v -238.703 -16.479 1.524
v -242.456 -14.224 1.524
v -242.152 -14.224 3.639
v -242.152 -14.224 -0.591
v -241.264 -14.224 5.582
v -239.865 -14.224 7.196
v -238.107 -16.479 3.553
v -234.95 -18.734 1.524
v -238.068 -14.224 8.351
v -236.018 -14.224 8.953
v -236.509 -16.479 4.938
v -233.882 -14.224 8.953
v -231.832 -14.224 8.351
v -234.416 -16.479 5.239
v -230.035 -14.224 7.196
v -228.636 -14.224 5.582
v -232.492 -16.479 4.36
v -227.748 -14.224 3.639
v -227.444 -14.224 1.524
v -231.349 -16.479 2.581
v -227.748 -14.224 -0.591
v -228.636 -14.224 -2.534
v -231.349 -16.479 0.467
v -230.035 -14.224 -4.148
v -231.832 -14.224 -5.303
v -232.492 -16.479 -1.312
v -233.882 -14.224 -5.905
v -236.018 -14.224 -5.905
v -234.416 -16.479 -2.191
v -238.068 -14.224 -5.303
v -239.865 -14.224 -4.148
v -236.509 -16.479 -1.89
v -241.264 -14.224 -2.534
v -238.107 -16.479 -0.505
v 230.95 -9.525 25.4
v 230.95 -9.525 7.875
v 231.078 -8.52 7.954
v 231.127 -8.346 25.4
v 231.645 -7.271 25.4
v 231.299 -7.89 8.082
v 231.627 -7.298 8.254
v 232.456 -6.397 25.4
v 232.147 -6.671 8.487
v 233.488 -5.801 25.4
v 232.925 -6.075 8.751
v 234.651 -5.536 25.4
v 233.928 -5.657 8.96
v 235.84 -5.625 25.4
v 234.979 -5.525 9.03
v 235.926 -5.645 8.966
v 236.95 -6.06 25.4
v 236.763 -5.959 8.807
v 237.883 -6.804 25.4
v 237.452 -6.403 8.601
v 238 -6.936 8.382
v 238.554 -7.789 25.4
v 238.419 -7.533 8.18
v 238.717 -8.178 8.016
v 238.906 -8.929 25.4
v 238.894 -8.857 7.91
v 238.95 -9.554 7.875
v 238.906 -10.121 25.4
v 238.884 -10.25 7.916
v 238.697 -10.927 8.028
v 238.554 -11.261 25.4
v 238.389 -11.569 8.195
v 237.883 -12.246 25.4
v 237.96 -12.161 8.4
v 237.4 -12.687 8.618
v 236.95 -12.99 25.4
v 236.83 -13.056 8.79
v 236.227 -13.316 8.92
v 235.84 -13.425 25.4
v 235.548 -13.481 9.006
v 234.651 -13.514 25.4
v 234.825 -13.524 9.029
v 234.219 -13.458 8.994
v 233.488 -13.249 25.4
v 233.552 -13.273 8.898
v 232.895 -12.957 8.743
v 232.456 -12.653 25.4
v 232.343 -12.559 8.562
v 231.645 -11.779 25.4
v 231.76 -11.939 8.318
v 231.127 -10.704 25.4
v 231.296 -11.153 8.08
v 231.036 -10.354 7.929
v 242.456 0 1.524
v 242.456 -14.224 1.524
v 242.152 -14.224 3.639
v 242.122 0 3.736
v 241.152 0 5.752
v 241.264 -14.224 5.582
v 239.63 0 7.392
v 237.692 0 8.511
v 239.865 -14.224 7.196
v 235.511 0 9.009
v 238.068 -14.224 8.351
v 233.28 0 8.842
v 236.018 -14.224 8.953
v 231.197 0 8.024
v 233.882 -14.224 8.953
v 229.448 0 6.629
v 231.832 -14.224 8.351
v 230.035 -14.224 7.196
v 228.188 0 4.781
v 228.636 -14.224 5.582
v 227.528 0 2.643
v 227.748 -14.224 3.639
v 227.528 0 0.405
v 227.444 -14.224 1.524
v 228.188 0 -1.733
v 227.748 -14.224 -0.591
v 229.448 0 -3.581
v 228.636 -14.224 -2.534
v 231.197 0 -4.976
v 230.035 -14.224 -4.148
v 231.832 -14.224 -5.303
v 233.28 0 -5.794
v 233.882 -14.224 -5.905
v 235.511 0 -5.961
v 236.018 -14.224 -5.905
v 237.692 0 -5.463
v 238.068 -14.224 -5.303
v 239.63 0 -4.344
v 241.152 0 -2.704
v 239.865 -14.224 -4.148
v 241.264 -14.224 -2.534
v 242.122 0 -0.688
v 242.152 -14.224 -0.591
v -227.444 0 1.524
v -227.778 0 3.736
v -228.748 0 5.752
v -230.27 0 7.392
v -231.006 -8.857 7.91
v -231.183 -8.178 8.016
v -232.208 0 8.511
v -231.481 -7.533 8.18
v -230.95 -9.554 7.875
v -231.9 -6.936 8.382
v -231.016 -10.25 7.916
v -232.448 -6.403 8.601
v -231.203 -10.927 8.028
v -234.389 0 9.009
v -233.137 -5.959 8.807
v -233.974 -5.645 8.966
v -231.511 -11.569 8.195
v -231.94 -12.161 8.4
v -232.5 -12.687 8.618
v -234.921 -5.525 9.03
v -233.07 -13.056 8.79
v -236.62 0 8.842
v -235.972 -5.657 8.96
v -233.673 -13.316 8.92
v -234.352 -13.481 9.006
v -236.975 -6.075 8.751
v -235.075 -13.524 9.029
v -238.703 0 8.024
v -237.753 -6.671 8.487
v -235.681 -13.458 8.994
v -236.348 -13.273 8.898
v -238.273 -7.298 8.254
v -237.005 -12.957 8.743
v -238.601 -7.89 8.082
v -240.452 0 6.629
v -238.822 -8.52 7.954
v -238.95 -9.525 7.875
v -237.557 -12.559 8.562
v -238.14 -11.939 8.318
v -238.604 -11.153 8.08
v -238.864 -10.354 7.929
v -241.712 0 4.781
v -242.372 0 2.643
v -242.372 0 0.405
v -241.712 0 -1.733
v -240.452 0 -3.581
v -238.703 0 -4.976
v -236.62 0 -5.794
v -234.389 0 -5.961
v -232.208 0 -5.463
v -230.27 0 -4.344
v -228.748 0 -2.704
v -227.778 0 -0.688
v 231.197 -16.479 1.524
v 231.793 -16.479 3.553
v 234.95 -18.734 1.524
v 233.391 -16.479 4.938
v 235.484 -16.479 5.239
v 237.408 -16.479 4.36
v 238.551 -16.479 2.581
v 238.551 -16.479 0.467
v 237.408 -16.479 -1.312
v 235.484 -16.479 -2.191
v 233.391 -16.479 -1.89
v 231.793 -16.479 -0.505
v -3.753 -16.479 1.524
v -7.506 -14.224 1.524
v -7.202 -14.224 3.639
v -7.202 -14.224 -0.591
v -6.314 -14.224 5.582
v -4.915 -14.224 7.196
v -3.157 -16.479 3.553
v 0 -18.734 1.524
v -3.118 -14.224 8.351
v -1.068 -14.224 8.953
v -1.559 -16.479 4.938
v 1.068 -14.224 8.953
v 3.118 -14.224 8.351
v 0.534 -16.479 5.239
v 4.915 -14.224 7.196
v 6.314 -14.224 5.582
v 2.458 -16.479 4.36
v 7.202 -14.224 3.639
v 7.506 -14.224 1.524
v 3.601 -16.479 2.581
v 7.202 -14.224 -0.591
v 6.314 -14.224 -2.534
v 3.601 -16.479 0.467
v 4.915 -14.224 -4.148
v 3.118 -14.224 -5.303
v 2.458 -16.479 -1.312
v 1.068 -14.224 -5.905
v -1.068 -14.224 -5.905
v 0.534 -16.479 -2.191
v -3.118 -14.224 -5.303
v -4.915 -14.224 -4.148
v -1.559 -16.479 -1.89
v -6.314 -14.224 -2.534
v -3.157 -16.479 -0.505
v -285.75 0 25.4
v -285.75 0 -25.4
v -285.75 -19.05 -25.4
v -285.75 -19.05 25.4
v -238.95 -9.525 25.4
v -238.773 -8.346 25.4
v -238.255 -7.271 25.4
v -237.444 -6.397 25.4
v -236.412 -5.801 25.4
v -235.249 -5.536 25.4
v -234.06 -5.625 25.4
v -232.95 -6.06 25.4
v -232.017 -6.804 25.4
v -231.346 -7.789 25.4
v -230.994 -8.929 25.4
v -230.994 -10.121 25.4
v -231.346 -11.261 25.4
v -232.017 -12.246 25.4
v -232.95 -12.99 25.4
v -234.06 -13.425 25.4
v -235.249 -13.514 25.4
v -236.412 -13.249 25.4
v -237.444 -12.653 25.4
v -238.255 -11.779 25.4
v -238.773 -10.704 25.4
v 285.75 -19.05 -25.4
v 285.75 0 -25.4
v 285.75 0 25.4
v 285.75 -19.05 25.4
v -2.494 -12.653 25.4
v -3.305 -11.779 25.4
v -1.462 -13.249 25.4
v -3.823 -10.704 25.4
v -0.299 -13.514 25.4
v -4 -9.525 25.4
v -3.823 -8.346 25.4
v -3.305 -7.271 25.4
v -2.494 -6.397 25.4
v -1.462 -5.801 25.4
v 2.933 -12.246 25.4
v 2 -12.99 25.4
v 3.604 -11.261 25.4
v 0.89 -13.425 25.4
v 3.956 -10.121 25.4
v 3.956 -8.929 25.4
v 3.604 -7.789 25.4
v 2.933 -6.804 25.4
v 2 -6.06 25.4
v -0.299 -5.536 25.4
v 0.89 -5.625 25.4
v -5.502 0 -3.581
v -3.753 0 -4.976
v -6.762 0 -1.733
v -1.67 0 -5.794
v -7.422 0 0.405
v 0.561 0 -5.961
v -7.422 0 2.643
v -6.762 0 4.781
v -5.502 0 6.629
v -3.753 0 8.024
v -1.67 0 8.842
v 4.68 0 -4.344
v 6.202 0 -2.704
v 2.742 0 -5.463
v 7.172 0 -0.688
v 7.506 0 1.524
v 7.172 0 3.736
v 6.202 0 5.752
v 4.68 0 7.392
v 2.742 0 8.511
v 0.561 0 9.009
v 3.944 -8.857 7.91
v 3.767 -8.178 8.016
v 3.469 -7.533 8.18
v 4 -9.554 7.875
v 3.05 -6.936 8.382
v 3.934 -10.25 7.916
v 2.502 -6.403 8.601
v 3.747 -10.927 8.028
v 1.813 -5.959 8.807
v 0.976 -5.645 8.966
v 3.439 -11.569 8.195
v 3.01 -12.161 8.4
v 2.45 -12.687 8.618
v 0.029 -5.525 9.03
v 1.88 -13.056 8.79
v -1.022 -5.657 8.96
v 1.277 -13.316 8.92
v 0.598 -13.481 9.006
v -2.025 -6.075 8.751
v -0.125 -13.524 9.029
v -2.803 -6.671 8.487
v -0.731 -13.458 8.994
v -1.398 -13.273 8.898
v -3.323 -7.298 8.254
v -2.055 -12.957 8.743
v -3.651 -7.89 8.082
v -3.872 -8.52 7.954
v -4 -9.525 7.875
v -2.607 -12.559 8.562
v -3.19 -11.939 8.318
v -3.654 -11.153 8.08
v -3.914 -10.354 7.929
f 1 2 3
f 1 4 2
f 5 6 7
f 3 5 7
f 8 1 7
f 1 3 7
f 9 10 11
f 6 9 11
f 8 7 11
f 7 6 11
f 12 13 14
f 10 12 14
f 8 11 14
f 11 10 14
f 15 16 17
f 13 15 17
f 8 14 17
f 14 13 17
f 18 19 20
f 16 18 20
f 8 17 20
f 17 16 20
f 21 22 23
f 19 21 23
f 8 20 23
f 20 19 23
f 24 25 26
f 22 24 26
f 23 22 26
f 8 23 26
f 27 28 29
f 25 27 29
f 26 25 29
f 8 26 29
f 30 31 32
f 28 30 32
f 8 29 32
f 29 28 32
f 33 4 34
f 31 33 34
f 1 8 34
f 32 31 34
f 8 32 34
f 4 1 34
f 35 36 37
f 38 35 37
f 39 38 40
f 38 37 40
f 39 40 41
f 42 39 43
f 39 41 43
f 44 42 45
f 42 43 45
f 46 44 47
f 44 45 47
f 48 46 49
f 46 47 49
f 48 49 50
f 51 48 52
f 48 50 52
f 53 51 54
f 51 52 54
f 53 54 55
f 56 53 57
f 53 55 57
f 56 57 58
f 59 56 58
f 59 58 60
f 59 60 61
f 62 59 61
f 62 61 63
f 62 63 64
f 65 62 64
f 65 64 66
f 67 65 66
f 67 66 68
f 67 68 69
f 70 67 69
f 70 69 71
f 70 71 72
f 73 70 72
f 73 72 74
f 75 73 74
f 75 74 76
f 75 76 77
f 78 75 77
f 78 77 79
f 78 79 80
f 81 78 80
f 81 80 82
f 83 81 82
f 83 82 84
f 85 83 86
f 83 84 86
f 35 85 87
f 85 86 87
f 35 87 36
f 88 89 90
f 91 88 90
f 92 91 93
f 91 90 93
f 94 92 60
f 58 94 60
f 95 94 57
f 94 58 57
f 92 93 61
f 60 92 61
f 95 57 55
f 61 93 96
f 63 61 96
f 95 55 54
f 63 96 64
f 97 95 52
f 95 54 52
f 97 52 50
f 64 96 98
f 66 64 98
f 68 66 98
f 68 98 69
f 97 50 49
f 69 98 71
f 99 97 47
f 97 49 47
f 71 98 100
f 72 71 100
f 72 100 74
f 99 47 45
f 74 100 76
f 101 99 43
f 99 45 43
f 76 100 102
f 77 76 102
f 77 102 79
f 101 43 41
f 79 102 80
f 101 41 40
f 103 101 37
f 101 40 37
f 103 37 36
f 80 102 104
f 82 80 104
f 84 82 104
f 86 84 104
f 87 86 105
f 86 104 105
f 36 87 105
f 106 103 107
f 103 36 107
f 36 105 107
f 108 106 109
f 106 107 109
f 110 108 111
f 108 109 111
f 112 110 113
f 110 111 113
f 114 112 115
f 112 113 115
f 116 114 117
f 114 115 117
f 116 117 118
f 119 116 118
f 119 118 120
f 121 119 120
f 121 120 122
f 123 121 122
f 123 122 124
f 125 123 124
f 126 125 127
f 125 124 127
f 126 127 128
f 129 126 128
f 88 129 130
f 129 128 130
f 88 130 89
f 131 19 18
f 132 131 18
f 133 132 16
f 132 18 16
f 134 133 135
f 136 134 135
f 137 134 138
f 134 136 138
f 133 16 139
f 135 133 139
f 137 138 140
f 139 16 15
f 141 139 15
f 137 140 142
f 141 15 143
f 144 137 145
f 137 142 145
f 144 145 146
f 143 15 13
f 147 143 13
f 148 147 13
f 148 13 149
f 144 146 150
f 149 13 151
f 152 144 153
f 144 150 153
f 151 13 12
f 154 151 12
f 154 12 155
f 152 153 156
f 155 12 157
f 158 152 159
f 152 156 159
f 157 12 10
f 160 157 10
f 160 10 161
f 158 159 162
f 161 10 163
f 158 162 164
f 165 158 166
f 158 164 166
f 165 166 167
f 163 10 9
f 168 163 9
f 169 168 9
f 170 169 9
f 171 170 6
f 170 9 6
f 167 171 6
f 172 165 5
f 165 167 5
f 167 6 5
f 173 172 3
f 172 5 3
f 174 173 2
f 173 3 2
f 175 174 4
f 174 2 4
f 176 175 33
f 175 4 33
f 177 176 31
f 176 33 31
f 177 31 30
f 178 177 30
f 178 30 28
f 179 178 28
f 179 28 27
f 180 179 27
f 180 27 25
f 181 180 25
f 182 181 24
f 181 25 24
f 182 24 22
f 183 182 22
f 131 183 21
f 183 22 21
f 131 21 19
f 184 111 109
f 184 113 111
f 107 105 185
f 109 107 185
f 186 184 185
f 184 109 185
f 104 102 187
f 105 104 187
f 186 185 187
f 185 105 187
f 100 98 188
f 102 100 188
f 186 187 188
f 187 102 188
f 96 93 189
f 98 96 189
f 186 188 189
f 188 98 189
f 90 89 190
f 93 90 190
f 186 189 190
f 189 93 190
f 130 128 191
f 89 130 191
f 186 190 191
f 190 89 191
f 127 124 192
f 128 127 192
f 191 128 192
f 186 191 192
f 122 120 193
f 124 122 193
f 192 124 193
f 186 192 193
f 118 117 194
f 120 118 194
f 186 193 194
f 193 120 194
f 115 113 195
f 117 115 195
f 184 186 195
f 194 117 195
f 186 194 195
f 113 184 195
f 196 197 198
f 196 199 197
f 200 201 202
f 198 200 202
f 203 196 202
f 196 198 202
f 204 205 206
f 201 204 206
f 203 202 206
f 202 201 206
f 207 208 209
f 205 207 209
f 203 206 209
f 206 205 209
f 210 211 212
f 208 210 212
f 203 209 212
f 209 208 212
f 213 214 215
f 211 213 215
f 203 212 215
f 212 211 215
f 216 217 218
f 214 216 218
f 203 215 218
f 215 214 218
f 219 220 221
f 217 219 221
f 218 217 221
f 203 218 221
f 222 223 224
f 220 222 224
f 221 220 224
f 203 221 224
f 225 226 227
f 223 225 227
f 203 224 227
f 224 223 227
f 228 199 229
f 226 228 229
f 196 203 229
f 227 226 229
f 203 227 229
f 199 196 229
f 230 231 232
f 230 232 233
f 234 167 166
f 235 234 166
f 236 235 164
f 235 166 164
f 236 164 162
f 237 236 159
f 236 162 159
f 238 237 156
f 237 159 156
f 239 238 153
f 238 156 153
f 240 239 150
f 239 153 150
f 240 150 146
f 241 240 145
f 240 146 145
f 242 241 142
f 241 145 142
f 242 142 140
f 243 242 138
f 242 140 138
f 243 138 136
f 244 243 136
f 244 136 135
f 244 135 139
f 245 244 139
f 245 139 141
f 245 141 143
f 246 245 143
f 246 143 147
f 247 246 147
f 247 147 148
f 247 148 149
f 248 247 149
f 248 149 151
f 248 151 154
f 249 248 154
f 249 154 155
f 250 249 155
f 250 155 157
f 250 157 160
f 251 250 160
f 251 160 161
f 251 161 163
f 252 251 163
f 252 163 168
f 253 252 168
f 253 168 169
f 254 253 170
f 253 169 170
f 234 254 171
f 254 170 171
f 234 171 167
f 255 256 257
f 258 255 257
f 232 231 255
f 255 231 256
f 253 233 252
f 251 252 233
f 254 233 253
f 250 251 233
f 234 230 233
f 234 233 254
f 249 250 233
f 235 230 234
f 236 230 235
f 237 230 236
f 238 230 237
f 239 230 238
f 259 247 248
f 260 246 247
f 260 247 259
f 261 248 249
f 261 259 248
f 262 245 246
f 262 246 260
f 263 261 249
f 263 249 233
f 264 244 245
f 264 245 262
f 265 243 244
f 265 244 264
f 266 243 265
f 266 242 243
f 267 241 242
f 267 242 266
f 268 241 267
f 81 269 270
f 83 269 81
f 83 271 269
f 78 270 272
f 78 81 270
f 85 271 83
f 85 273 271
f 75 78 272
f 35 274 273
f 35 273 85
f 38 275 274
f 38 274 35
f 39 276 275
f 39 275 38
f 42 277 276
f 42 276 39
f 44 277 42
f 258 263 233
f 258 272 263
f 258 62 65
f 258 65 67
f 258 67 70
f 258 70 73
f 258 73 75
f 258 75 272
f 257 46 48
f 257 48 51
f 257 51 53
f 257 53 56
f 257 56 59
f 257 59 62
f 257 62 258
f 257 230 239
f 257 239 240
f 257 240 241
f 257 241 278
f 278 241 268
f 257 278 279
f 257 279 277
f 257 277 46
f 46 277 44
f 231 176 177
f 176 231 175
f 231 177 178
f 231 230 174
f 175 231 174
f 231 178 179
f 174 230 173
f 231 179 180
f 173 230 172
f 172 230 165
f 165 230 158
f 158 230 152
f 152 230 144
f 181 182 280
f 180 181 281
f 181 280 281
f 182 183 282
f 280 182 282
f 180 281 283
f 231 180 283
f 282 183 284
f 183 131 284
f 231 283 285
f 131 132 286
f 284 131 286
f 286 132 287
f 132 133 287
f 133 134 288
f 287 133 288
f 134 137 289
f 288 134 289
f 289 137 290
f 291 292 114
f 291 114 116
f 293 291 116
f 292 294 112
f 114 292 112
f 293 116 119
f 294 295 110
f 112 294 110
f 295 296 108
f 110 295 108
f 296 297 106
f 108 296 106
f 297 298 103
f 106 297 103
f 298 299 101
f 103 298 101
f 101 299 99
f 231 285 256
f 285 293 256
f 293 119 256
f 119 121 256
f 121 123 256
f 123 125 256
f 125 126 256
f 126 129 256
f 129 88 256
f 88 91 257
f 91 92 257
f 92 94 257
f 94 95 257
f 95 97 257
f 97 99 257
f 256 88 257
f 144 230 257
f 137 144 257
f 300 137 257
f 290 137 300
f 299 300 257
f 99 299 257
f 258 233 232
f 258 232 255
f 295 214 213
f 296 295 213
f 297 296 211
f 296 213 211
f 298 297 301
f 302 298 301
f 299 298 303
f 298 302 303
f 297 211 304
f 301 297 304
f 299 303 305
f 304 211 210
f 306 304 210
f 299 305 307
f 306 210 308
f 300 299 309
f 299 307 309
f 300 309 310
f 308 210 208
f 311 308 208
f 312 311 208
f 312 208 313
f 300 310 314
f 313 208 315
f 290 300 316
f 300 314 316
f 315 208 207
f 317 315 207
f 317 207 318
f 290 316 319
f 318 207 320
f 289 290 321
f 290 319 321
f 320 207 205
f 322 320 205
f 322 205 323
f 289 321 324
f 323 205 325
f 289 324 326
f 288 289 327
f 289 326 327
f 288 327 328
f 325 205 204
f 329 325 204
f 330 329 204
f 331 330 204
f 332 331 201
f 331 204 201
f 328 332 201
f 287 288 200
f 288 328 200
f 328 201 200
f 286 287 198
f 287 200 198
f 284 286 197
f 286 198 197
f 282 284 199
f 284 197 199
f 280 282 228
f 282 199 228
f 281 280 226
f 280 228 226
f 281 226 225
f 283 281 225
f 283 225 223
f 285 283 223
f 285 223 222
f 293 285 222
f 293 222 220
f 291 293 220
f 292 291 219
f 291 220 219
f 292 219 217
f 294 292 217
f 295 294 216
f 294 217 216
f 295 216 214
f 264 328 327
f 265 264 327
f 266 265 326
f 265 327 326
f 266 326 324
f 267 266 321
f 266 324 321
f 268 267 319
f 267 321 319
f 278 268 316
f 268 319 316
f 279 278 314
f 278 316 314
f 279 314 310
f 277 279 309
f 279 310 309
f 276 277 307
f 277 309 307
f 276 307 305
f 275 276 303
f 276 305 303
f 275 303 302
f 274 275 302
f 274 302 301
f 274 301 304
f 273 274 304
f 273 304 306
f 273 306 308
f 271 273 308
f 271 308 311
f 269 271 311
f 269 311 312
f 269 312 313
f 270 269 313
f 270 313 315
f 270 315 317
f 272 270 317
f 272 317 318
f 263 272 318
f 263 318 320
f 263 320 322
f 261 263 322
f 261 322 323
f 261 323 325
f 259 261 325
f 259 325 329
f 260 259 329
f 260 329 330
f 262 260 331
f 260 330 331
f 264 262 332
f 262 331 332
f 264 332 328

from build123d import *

# Parameters (mm, degrees)
F0_W     = 571.5
F0_H     = 50.8
F1_DEPTH = 19.05
F3_D     = 15.0114
F3_DEPTH = 14.224
F3_TIP   = 4.5098795482
F5_D     = 8.001
F5_DEPTH = 25.4
F5_TIP   = 2.4037429064


with BuildPart() as f1:
    # F0 (on Front) → F1 (new body)
    with BuildSketch(Plane.XZ):
        Rectangle(F0_W, F0_H)
    extrude(amount=F1_DEPTH)

    # F3
    with Locations(Plane(origin=(0, 0, 0), x_dir=(-1, 0, 0), z_dir=(0, 1, 0))):
        with Locations((234.95, 1.524), (0, 1.524), (-234.95, 1.524)):
            Hole(F3_D / 2, depth=F3_DEPTH)
            with Locations((0, 0, -(F3_DEPTH + F3_TIP / 2))):  # 118° drill point
                Cone(0, F3_D / 2, F3_TIP, mode=Mode.SUBTRACT)

    # F5
    with Locations(Plane.XY.offset(25.4)):
        with Locations((-234.95, -9.525), (0, -9.525), (234.95, -9.525)):
            Hole(F5_D / 2, depth=F5_DEPTH)
            with Locations((0, 0, -(F5_DEPTH + F5_TIP / 2))):  # 118° drill point
                Cone(0, F5_D / 2, F5_TIP, mode=Mode.SUBTRACT)


solid = f1.part
